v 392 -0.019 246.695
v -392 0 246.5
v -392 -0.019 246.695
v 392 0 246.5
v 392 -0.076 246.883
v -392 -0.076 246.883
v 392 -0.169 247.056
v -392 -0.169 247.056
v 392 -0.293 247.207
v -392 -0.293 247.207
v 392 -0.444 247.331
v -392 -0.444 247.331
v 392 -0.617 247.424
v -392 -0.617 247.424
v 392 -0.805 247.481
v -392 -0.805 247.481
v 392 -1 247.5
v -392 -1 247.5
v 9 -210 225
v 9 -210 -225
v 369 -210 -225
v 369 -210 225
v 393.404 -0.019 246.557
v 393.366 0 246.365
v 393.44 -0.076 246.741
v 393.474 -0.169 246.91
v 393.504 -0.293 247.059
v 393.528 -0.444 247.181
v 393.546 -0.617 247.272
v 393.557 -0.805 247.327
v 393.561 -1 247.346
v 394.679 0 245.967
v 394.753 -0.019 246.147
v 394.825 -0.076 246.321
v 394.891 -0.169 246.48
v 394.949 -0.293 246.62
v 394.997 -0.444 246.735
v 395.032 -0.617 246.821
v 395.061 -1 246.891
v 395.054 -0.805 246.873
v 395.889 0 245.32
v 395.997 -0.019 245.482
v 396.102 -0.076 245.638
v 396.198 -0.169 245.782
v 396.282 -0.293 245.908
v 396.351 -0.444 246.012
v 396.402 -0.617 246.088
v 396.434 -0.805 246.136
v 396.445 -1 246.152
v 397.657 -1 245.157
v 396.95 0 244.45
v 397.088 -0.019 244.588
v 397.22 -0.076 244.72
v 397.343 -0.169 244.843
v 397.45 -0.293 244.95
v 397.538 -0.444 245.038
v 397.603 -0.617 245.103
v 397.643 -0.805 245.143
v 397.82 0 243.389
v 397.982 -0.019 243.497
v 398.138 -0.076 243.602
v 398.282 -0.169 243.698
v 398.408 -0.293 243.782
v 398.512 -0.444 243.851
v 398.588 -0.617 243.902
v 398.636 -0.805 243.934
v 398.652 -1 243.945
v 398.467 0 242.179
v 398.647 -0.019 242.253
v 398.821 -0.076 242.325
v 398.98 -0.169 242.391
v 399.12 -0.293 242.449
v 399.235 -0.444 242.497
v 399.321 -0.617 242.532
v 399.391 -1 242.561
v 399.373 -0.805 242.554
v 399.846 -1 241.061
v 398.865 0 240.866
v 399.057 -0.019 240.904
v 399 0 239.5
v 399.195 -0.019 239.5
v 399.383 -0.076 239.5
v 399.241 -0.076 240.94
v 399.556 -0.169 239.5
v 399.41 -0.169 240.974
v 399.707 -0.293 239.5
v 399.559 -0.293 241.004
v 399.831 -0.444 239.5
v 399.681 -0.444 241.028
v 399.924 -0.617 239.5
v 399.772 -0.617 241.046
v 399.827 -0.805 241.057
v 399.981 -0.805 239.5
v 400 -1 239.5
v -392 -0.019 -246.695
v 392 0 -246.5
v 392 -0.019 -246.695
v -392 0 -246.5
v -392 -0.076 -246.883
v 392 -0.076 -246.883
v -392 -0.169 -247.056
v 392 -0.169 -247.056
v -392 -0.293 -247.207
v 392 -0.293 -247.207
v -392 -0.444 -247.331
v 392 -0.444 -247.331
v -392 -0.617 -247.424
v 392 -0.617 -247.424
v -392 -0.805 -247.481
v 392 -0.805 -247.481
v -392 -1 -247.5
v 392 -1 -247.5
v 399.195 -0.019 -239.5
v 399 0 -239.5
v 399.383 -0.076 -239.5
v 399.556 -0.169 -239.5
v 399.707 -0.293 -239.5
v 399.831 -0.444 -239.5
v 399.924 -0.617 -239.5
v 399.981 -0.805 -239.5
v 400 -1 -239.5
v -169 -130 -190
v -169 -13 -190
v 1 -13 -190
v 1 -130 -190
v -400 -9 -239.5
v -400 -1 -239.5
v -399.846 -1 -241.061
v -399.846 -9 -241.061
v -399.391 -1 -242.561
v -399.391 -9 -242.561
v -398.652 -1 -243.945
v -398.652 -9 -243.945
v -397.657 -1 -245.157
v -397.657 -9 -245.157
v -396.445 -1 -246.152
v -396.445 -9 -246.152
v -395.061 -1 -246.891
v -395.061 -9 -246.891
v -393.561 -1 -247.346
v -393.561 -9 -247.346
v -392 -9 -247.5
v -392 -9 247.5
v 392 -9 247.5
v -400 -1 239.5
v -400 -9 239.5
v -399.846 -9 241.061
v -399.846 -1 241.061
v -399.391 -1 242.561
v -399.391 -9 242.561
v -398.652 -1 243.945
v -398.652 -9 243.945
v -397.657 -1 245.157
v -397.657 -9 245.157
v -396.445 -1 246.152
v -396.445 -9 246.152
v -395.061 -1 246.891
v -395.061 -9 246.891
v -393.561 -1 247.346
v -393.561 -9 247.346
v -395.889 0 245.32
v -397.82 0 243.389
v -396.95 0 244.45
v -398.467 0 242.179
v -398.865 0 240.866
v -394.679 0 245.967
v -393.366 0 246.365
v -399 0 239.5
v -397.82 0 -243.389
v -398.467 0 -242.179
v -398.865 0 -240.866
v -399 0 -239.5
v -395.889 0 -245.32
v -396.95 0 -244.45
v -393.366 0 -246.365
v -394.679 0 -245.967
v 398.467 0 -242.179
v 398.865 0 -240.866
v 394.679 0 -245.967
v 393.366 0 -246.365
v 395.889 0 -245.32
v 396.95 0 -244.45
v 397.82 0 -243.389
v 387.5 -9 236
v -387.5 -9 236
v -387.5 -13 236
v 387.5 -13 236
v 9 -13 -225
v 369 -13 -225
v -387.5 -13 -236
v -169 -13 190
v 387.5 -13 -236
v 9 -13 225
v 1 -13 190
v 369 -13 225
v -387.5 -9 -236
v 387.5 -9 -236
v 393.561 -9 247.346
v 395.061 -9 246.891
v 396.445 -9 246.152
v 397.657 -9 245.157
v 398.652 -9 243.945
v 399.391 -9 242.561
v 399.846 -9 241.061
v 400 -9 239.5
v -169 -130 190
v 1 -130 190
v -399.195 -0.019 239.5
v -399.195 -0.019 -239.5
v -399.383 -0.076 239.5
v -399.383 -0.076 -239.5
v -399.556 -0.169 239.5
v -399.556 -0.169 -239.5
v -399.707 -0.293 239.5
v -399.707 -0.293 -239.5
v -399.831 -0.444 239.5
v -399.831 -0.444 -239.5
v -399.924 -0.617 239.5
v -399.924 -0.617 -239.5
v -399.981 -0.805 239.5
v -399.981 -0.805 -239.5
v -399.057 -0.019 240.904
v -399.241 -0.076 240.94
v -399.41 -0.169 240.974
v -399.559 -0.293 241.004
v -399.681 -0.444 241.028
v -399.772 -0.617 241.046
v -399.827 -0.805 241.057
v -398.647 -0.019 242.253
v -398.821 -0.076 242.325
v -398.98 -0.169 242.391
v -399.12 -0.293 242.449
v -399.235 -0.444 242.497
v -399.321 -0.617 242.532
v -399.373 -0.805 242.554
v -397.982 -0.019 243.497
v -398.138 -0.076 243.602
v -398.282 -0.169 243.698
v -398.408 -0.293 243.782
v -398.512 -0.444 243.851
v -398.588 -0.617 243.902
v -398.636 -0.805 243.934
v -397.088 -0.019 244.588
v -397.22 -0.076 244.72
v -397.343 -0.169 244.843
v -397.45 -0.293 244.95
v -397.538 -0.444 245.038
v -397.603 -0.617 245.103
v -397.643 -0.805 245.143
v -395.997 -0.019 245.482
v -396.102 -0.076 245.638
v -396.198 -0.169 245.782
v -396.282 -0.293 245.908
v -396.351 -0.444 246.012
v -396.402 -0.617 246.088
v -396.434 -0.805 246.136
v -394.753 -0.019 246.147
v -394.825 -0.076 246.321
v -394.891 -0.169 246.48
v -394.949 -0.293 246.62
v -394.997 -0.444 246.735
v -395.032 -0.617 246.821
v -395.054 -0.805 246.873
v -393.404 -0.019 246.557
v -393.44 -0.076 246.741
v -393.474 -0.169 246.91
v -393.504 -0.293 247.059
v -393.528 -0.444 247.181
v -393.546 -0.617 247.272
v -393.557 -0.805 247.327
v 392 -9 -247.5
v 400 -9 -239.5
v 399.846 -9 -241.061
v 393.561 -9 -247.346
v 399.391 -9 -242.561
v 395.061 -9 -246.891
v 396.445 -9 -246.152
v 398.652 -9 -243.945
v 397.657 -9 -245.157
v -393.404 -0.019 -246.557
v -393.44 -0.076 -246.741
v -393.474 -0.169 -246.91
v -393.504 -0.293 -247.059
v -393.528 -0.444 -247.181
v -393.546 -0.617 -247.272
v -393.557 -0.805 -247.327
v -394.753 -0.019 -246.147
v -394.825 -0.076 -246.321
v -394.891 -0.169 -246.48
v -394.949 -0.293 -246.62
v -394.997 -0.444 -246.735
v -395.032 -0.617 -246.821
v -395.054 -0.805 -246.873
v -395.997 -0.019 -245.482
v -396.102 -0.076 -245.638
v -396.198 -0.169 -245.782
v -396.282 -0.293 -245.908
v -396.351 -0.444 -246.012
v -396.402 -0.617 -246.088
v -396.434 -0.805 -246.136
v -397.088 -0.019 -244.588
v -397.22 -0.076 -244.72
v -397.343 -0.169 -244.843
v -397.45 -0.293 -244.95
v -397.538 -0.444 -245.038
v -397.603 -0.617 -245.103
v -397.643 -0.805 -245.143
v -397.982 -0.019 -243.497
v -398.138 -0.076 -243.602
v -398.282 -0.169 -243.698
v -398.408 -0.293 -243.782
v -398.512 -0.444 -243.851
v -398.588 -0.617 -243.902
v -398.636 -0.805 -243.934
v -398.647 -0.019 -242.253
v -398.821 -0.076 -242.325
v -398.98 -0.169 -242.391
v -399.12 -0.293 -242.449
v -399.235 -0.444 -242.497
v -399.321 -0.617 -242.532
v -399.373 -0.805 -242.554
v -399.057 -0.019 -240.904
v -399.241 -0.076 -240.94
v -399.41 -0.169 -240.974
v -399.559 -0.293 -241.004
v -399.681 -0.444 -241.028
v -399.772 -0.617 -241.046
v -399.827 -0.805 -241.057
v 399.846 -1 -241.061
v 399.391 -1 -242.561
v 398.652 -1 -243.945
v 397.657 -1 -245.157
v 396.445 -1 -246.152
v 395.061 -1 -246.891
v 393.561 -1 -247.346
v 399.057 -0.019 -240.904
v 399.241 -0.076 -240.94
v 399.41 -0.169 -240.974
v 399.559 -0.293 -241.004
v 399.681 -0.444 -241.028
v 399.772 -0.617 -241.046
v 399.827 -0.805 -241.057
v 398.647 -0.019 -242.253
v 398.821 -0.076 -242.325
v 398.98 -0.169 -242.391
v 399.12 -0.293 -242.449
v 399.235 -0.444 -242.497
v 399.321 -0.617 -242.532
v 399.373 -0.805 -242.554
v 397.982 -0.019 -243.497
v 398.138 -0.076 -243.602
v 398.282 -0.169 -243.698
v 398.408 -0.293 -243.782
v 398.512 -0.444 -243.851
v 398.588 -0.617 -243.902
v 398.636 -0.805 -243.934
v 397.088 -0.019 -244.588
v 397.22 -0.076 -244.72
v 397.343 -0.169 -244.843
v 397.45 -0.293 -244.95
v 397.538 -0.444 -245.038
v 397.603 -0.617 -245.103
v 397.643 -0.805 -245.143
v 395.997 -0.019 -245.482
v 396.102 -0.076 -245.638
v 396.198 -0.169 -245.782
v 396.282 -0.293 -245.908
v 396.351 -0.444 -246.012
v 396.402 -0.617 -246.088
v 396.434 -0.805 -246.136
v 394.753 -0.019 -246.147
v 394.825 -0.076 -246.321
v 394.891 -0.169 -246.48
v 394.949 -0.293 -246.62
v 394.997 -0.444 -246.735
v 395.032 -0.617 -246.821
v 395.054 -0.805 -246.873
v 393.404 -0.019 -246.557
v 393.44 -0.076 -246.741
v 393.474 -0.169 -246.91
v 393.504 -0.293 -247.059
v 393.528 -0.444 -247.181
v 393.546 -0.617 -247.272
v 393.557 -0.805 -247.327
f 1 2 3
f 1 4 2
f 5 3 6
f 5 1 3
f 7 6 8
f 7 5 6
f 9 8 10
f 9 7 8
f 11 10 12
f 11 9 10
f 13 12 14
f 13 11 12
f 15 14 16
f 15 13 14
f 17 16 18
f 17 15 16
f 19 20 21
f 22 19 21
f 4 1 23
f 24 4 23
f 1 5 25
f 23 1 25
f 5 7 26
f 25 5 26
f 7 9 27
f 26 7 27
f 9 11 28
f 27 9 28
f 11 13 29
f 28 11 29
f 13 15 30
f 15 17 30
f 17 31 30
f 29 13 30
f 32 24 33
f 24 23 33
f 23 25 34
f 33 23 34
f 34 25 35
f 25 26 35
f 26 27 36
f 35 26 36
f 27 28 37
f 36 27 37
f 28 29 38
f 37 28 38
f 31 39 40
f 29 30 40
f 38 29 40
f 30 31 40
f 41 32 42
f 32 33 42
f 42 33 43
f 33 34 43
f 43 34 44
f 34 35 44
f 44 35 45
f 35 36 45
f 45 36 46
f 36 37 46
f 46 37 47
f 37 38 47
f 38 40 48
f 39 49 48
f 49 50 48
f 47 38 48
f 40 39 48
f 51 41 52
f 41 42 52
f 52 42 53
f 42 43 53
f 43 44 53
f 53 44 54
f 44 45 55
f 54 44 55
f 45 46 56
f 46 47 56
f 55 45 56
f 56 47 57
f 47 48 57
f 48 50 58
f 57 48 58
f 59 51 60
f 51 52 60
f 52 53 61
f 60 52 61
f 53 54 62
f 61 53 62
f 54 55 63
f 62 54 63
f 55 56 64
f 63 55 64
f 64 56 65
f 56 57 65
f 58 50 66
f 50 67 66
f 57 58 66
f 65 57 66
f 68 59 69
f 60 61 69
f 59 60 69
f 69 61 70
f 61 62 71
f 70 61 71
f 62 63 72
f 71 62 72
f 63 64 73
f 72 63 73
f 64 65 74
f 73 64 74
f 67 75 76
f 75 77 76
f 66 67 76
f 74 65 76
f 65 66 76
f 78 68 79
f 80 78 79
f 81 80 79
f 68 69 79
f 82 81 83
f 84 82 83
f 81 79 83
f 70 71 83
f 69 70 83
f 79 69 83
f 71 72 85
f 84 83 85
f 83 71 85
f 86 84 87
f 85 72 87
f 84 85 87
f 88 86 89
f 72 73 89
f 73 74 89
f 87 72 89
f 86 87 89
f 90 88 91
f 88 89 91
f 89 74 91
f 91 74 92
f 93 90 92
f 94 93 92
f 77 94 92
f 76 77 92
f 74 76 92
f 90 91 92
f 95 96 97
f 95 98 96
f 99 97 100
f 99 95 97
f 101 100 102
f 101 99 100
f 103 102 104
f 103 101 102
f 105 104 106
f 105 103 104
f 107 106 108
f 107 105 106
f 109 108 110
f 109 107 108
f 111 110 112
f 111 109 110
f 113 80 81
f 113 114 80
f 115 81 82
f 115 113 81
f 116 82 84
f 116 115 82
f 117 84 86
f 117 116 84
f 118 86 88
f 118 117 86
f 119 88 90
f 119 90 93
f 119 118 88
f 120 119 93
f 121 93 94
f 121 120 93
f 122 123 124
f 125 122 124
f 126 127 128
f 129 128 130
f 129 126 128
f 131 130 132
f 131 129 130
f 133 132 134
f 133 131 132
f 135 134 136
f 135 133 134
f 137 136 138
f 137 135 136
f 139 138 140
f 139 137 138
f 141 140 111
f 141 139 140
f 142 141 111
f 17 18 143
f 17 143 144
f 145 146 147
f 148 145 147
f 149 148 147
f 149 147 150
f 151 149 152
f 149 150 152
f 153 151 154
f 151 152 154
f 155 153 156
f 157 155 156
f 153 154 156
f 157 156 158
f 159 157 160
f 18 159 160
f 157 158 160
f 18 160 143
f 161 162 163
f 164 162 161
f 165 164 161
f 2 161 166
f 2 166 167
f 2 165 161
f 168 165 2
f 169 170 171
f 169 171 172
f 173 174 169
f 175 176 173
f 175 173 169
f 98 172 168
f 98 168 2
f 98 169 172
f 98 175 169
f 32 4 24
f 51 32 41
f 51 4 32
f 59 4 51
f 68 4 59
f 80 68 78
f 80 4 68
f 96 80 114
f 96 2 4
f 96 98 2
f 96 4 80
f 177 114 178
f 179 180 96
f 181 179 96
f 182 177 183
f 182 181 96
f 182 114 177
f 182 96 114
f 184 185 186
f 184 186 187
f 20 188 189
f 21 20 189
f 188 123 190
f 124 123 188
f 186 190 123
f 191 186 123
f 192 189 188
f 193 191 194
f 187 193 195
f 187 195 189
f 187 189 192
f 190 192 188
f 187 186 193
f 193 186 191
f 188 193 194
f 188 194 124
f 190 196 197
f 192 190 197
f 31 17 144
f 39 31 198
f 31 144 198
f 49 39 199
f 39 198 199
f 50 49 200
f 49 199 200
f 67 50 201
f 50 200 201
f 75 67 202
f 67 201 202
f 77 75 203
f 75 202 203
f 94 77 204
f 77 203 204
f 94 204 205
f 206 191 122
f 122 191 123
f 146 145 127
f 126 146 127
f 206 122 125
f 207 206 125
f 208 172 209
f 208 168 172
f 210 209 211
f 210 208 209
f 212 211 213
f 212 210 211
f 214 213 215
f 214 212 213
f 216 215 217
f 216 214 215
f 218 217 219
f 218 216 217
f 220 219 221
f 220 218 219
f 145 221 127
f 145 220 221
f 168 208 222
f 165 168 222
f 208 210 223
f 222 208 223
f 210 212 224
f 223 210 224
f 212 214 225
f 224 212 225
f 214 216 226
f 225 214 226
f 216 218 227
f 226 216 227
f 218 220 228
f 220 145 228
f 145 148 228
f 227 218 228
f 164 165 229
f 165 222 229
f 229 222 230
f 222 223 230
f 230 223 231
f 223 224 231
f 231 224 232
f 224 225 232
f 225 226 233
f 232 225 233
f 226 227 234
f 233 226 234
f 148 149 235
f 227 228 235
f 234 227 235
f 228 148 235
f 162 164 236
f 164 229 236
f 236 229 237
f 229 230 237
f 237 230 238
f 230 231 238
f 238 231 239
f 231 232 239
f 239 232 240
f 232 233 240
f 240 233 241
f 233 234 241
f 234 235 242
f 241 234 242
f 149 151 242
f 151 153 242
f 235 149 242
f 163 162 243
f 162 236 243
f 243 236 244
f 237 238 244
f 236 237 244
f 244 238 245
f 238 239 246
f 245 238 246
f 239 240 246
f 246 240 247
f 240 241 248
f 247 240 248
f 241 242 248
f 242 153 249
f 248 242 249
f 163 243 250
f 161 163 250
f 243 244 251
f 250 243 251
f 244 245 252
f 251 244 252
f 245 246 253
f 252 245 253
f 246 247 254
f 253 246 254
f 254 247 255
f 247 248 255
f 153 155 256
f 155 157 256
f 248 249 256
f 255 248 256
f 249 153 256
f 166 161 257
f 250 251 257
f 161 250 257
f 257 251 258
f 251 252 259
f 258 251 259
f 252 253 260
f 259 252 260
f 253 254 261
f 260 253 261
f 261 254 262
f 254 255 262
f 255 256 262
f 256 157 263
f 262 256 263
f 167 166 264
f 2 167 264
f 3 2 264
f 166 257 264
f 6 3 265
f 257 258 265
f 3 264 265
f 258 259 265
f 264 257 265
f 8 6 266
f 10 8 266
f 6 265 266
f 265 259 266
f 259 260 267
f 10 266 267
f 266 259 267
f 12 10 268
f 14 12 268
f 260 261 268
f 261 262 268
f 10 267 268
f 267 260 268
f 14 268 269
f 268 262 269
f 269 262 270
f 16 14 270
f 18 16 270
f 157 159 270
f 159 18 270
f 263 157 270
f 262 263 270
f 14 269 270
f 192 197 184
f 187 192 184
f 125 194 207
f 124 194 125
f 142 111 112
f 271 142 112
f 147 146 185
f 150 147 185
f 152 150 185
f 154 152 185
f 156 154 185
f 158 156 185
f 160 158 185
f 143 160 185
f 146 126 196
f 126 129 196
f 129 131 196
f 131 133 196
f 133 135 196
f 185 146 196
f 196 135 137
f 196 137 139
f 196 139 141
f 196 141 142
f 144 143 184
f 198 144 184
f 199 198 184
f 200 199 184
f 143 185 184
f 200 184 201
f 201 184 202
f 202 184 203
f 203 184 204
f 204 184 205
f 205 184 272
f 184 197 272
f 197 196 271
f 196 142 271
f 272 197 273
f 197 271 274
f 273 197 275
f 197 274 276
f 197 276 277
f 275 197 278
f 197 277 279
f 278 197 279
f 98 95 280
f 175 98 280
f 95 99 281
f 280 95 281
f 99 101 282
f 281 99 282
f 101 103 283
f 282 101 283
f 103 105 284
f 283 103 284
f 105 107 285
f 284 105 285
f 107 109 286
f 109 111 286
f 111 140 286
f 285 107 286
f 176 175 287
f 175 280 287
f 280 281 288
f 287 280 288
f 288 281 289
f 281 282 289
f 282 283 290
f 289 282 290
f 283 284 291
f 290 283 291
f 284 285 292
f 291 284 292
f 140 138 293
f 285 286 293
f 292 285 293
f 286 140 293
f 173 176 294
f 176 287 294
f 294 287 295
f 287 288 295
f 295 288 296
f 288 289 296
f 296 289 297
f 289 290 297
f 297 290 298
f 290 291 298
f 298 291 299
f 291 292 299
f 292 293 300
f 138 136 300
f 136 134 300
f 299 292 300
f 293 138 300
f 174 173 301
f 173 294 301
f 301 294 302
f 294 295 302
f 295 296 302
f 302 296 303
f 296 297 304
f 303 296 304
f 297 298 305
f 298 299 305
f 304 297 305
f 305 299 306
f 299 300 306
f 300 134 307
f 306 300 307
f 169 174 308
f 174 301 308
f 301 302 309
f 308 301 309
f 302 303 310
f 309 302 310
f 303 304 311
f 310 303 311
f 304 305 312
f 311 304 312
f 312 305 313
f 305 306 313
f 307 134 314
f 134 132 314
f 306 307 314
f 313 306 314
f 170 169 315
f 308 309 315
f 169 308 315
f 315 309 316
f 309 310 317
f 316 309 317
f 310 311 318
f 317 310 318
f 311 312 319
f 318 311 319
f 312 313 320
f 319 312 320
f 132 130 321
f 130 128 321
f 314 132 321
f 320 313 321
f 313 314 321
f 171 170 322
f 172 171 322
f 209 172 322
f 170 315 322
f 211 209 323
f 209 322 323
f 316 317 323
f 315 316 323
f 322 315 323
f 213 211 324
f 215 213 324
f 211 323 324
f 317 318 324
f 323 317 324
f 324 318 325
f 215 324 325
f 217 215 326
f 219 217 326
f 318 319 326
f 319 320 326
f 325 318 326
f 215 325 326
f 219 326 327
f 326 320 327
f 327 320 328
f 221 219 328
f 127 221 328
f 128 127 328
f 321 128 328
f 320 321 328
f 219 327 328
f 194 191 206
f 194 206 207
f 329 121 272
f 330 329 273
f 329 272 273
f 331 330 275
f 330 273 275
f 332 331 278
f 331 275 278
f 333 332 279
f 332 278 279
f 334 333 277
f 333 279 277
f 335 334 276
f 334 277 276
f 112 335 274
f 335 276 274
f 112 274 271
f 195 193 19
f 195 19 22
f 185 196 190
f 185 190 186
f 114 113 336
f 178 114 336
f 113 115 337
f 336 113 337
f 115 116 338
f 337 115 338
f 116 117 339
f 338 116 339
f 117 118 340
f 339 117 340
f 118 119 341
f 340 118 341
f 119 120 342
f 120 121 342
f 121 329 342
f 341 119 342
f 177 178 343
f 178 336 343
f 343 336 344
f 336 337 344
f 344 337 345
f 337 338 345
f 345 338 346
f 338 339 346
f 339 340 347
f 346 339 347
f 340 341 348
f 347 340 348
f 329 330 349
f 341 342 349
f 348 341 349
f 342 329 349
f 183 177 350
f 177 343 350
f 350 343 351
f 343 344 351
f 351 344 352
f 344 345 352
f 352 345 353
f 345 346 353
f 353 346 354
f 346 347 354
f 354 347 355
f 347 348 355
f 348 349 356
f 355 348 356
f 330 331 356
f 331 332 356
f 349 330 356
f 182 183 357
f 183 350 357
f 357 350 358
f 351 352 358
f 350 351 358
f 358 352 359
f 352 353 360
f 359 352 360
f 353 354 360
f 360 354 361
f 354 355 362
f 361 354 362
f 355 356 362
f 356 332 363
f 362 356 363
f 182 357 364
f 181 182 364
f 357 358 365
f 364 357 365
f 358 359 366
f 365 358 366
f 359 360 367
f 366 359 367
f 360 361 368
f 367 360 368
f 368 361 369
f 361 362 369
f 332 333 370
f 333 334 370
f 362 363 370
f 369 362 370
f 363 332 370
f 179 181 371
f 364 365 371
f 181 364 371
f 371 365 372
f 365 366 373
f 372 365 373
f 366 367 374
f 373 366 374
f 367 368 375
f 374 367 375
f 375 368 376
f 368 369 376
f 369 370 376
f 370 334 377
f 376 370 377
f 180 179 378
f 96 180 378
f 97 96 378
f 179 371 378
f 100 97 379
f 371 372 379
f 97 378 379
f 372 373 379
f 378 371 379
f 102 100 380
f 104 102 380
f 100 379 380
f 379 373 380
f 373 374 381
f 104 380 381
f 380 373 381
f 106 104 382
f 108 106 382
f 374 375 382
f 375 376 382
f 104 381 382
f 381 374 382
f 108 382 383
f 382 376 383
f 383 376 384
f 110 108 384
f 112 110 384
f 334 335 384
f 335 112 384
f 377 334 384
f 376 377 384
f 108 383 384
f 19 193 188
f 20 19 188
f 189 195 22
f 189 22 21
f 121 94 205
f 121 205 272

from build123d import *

# Parameters (mm, degrees)
SKETCH1_W           = 800
SKETCH1_H           = 495
BOSS_EXTRUDE1_DEPTH = 9
FILLET1_R           = 8
FILLET2_R           = 1
SKETCH2_W           = 775
SKETCH2_H           = 472
BOSS_EXTRUDE2_DEPTH = 4
SKETCH3_W           = 170
SKETCH3_H           = 380
BOSS_EXTRUDE3_DEPTH = 130
SKETCH4_W           = 360
SKETCH4_H           = 450
BOSS_EXTRUDE4_DEPTH = 210


with BuildPart() as part:
    # Sketch1 → Boss-Extrude1 (new body)
    with BuildSketch(Plane(origin=(0, 0, 0), x_dir=(1, 0, 0), z_dir=(0, 1, 0))):
        Rectangle(SKETCH1_W, SKETCH1_H)
    extrude(amount=-BOSS_EXTRUDE1_DEPTH)

    # Fillet1
    fillet1_edges = [part.edges().sort_by_distance(p)[0] for p in [
        (-400, -4.5, -247.5),
        (400, -4.5, -247.5),
        (400, -4.5, 247.5),
        (-400, -4.5, 247.5),
    ]]
    fillet(fillet1_edges, radius=FILLET1_R)

    # Fillet2
    fillet2_edges = [part.edges().sort_by_distance(p)[0] for p in [
        (400, 0, 0),
        (-400, 0, 0),
        (0, 0, 247.5),
        (0, 0, -247.5),
        (397.656854249, 0, 245.156854249),
        (-397.656854249, 0, 245.156854249),
        (-397.656854249, 0, -245.156854249),
        (397.656854249, 0, -245.156854249),
    ]]
    fillet(fillet2_edges, radius=FILLET2_R)

    # Sketch2 → Boss-Extrude2 (add)
    with BuildSketch(Plane.XZ.offset(9)):
        Rectangle(SKETCH2_W, SKETCH2_H)
    extrude(amount=BOSS_EXTRUDE2_DEPTH)

    # Sketch3 → Boss-Extrude3 (add)
    with BuildSketch(Plane(origin=(0, 0, 0), x_dir=(1, 0, 0), z_dir=(0, 1, 0))):
        with Locations((-84, 0)):
            Rectangle(SKETCH3_W, SKETCH3_H)
    extrude(amount=-BOSS_EXTRUDE3_DEPTH)

    # Sketch4 → Boss-Extrude4 (add)
    with BuildSketch(Plane(origin=(0, 0, 0), x_dir=(1, 0, 0), z_dir=(0, 1, 0))):
        with Locations((189, 0)):
            Rectangle(SKETCH4_W, SKETCH4_H)
    extrude(amount=-BOSS_EXTRUDE4_DEPTH)


solid = part.part
